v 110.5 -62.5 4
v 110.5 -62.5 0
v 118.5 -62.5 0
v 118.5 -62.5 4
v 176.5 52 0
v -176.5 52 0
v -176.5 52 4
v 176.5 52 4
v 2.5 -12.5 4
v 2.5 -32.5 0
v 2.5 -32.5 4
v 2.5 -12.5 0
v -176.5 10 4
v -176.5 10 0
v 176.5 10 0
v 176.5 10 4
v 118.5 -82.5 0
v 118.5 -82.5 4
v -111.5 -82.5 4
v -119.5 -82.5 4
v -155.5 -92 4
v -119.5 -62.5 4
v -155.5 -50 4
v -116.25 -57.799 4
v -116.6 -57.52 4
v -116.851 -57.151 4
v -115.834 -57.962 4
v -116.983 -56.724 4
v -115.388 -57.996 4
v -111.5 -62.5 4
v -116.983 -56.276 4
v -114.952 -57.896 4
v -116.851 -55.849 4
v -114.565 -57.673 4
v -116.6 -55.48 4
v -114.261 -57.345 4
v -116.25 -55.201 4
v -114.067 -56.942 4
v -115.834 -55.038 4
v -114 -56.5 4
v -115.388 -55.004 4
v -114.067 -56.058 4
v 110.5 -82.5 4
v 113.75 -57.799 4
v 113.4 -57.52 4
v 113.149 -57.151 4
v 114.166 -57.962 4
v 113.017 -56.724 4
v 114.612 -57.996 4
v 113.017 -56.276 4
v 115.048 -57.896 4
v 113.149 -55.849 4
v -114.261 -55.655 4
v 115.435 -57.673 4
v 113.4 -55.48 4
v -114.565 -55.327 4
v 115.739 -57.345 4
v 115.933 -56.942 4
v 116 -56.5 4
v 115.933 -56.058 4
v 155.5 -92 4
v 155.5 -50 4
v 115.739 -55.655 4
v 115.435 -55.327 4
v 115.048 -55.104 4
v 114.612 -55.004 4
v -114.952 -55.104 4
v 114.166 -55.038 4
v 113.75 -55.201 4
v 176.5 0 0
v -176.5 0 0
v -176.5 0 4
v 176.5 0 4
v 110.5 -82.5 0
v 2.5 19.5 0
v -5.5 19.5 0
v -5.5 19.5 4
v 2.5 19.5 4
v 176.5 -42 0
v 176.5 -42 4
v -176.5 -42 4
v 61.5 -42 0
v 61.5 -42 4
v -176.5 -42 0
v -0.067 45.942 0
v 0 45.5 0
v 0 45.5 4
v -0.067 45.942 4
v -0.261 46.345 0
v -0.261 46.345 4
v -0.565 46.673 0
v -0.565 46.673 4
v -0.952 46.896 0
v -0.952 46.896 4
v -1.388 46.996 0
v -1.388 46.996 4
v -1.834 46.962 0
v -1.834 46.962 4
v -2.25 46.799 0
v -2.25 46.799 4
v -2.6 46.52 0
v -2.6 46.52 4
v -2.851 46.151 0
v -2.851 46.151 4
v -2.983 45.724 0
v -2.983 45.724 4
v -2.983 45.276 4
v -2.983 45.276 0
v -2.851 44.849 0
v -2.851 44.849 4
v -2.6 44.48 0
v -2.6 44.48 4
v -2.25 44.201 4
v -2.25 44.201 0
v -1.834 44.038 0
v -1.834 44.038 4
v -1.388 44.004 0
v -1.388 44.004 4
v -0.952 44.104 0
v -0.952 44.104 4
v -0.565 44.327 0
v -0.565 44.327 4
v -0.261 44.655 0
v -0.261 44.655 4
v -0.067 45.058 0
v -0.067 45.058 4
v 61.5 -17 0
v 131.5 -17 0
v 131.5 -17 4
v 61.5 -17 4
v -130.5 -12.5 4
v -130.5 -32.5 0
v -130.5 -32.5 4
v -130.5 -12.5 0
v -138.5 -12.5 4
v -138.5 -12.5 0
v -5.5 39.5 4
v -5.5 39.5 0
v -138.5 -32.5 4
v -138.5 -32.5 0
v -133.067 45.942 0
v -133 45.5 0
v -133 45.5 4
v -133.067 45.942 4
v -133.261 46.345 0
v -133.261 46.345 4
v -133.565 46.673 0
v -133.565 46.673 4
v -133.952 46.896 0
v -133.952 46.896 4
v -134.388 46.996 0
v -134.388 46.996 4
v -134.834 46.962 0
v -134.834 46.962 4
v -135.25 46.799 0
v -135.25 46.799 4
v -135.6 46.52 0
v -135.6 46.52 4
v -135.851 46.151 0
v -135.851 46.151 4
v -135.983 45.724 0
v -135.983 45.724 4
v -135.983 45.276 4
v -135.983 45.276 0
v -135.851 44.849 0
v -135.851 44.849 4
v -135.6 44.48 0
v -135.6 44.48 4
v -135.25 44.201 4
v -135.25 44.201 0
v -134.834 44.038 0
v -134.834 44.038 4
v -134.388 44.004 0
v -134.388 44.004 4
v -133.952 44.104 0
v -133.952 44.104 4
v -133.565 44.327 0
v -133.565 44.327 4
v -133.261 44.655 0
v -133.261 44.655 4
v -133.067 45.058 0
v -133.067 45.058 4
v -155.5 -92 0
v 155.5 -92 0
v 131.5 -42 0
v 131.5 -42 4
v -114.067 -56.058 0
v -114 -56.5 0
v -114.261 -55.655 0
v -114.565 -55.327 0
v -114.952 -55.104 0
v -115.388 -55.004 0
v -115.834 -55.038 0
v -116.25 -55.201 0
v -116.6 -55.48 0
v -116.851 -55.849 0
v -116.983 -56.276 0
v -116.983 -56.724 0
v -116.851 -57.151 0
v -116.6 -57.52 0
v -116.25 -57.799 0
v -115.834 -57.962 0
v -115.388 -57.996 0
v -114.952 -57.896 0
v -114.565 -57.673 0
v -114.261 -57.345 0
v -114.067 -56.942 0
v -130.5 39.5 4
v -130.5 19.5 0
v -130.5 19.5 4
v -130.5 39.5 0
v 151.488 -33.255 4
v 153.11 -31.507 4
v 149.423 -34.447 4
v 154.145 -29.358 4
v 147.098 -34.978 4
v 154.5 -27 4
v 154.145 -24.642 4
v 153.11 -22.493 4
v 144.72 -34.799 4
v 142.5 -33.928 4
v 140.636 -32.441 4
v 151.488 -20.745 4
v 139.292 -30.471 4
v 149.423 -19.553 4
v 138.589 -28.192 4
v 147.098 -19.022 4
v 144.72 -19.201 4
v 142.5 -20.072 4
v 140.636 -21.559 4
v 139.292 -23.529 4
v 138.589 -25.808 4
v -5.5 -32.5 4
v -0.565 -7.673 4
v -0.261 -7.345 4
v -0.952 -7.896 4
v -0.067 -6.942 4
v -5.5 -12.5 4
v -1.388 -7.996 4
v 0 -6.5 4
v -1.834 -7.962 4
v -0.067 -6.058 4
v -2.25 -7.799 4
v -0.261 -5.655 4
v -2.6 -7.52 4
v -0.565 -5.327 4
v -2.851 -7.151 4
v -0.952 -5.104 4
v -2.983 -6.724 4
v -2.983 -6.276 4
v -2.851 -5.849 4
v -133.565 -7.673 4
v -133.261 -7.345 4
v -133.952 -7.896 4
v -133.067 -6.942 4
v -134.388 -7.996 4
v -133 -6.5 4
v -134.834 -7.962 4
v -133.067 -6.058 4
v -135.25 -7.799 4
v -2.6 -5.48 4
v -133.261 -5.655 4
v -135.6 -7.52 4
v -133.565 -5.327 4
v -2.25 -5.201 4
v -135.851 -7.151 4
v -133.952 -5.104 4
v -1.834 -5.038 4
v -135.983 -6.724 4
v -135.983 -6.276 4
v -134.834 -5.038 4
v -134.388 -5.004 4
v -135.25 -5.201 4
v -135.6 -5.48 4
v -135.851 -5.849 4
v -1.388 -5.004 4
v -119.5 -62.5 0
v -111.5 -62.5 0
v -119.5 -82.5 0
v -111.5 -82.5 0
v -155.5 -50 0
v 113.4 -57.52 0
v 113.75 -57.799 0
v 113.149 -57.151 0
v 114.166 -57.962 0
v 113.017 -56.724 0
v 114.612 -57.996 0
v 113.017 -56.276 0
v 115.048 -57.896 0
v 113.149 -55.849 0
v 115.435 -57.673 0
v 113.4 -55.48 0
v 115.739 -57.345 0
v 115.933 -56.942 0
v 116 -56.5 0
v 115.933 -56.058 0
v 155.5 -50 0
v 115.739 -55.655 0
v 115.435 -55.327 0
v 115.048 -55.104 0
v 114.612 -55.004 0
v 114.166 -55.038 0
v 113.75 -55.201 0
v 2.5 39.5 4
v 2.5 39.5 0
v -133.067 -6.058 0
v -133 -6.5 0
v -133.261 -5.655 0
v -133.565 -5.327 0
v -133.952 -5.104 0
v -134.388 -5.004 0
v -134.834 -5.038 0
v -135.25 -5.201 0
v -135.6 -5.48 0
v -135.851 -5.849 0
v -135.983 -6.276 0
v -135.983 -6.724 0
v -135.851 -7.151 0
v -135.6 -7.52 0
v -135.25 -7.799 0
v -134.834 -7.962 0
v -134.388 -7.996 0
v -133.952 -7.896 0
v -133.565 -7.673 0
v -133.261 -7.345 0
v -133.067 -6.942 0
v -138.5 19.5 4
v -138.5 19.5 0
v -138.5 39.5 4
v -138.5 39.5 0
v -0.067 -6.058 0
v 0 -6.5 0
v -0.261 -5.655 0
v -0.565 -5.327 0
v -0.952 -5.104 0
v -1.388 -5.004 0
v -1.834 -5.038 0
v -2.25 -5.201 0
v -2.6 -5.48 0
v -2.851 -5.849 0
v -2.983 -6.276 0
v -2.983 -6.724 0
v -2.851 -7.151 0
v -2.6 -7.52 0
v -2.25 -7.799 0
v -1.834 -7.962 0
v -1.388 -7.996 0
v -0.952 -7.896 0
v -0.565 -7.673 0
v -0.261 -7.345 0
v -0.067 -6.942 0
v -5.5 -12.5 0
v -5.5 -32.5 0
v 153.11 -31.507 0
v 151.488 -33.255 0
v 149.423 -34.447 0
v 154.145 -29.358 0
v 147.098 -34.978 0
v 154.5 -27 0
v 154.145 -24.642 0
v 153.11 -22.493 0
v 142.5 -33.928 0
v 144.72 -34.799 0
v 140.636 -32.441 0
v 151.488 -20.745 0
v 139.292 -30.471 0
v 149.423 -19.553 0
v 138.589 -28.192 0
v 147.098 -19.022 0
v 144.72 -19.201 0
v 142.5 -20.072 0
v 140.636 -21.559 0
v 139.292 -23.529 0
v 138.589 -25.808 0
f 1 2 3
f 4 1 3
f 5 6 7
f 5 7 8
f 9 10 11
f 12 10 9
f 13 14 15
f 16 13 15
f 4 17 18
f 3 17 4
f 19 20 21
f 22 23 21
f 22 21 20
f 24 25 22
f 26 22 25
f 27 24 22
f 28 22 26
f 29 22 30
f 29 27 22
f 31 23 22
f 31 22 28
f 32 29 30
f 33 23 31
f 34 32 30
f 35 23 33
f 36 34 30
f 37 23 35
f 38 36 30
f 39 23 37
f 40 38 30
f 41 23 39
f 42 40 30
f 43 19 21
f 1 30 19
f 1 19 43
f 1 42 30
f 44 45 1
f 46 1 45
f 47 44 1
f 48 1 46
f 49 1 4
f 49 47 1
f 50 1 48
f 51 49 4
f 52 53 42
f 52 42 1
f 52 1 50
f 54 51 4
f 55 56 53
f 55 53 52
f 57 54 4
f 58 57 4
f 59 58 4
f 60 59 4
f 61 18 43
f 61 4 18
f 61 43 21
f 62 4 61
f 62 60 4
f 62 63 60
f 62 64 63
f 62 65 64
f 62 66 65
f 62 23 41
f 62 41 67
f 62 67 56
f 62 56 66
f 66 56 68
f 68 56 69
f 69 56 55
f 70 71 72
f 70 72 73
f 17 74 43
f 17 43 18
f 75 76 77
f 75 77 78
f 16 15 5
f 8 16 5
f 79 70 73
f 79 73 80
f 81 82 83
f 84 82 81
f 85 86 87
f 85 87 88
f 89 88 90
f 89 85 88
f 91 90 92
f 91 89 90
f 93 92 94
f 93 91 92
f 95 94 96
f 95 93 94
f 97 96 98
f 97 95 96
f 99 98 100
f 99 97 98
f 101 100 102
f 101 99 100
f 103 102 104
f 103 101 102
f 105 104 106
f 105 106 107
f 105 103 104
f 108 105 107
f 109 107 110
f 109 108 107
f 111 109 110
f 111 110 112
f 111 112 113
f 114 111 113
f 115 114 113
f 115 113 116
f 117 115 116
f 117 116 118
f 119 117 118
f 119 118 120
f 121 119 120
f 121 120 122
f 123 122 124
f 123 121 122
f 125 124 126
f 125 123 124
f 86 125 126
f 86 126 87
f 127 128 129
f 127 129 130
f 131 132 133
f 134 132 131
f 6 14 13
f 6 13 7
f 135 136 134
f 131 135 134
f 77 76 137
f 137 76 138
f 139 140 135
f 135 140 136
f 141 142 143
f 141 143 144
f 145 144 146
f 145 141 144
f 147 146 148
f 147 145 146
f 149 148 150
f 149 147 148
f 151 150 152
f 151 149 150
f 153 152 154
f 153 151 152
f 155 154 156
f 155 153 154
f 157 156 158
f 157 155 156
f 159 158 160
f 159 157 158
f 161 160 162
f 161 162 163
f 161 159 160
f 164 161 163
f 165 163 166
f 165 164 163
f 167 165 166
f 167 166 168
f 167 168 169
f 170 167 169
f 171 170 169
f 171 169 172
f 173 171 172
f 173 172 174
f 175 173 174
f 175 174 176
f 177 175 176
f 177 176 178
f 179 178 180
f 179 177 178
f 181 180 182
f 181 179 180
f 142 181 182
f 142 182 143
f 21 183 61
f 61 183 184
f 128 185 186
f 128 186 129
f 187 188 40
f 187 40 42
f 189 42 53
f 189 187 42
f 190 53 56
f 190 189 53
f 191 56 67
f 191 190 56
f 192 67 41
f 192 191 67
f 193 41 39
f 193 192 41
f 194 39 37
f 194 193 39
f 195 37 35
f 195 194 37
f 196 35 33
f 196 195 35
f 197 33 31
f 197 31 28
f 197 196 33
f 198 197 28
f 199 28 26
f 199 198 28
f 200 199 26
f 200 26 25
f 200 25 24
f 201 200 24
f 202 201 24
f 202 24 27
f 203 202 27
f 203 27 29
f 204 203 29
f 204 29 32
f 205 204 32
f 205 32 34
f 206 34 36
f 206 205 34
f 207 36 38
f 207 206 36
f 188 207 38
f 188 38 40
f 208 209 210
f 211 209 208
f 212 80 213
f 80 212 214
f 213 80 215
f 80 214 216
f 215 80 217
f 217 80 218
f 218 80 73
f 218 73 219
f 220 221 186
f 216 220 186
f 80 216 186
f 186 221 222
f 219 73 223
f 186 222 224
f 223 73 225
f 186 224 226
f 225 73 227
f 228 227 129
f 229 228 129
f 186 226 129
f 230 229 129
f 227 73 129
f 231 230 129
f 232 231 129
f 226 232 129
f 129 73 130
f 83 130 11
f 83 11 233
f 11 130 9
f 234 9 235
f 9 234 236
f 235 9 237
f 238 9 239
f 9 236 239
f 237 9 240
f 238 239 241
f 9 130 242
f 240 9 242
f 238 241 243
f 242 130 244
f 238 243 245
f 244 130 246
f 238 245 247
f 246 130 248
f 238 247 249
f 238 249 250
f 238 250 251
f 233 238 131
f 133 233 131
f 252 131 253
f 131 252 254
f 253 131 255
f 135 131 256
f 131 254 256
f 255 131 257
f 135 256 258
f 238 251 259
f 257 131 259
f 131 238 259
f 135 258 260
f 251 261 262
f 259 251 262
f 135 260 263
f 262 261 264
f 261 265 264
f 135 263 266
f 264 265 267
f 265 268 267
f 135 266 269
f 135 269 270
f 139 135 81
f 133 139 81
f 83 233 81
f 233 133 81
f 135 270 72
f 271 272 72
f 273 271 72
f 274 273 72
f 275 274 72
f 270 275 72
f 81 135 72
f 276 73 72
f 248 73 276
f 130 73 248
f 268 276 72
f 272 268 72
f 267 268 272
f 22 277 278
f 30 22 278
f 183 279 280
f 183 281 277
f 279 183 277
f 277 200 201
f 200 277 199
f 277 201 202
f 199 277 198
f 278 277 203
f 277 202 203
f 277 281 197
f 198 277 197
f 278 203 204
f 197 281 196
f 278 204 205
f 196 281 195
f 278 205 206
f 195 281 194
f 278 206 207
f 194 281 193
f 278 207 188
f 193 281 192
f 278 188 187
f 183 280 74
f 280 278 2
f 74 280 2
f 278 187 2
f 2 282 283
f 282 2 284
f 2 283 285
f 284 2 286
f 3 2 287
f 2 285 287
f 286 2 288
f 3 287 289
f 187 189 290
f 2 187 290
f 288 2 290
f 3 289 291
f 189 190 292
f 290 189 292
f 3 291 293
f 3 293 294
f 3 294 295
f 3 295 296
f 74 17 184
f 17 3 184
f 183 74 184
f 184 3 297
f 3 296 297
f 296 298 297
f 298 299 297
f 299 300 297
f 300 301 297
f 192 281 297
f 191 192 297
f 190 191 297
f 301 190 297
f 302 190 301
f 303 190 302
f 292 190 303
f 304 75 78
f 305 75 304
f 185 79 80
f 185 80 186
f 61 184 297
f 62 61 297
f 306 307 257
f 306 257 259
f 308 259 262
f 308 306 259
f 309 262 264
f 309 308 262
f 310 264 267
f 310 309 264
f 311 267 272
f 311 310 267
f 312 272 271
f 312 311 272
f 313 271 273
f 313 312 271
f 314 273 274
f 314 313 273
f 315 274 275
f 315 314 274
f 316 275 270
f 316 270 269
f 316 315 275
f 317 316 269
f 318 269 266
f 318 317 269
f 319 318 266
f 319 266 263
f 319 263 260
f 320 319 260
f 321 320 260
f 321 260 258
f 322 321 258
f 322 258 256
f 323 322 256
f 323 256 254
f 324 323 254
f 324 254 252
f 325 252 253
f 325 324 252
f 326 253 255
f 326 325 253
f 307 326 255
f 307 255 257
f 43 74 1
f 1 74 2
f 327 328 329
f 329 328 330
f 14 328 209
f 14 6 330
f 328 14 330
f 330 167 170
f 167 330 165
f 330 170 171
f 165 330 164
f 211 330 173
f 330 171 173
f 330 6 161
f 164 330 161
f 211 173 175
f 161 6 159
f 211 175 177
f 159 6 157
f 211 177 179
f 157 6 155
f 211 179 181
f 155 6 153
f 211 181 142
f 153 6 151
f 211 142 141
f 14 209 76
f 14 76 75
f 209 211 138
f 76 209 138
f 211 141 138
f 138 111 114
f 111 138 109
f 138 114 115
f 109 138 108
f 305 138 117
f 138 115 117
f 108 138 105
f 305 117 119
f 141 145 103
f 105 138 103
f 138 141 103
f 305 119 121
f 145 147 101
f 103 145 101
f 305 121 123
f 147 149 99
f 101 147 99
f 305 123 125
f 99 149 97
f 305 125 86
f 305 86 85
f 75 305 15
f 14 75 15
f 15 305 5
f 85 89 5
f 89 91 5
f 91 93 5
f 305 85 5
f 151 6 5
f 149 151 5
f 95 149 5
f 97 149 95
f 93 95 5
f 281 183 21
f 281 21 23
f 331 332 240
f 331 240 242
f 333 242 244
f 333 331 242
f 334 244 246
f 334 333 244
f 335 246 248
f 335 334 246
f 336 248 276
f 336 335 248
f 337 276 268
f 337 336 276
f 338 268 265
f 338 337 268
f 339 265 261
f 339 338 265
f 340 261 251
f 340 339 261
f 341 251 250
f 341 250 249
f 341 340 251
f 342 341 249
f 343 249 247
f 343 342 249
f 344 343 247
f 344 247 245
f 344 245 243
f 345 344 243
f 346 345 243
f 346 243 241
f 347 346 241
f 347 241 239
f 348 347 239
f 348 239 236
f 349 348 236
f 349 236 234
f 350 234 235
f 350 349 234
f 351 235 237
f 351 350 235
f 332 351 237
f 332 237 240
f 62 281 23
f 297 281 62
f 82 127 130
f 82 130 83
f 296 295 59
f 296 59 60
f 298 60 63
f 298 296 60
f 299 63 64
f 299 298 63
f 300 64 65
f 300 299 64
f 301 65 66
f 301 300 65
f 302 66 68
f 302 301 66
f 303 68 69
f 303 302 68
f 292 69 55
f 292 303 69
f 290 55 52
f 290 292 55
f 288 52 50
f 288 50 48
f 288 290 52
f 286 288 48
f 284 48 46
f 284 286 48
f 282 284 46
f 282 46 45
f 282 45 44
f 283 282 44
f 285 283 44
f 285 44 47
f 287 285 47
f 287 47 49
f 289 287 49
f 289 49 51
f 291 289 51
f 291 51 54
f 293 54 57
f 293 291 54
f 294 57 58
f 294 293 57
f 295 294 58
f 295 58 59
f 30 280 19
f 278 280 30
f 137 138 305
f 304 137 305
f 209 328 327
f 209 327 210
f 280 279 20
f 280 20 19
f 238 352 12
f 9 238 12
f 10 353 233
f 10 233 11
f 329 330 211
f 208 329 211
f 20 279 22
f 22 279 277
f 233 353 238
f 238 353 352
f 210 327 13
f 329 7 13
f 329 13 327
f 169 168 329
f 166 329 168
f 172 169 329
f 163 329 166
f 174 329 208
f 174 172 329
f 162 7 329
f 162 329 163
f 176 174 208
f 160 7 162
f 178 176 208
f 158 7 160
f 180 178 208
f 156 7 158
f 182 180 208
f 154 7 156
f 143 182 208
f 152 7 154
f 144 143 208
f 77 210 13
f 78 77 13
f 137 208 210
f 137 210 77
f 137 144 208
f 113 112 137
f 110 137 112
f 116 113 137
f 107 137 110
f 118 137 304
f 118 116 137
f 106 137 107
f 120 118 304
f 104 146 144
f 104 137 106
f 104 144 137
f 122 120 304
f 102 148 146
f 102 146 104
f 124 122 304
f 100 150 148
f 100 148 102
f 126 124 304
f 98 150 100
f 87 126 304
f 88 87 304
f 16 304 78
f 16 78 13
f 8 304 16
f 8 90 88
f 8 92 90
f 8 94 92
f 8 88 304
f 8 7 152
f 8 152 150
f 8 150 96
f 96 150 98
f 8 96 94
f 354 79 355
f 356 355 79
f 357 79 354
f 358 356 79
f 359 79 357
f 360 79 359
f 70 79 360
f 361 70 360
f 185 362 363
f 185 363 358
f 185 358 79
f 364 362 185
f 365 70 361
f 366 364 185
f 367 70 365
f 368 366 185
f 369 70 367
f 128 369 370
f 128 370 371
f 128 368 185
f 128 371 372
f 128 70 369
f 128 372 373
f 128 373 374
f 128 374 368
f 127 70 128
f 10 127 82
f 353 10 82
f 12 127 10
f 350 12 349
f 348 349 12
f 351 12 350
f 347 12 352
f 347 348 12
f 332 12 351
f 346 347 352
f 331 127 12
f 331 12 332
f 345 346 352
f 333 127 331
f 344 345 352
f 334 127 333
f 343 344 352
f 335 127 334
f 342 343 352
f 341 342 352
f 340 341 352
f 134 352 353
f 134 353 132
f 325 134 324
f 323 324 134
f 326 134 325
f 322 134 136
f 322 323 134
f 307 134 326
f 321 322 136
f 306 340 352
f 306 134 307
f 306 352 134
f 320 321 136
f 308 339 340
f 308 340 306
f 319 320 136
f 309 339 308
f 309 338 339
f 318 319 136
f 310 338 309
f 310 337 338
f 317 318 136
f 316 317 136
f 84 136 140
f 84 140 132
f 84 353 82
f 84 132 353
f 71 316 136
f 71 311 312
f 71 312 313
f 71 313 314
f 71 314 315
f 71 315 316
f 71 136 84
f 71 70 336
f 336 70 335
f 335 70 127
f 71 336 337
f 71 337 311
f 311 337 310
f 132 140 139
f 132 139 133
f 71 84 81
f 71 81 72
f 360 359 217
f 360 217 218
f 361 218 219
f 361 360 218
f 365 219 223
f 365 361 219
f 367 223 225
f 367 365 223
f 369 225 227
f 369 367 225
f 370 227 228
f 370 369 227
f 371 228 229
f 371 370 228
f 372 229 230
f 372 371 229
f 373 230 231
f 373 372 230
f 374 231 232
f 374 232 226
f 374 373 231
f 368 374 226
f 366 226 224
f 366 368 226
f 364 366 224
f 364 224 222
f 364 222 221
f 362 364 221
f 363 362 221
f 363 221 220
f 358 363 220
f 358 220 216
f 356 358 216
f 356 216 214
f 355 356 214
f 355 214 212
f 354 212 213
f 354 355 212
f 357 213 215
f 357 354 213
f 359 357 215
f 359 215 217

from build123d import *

# Parameters (mm, degrees)
SKETCH_R      = 1.5
SKETCH_R_2    = 8
SKETCH_W      = 8
SKETCH_H      = 20
PAD_DEPTH     = 4
SKETCH001_W   = 353
SKETCH001_H   = 42
SKETCH001_R   = 1.5
SKETCH001_W_2 = 8
SKETCH001_H_2 = 20
PAD001_DEPTH  = 4
SKETCH002_W   = 311
SKETCH002_H   = 42
SKETCH002_R   = 1.5
SKETCH002_W_2 = 8
SKETCH002_H_2 = 20
PAD002_DEPTH  = 4


with BuildPart() as left:
    # Sketch → Pad (new body)
    with BuildSketch(Plane.XY):
        Polygon((-176.5, 0), (176.5, 0), (176.5, -42), (131.5, -42), (131.5, -17), (61.5, -17), (61.5, -42), (-176.5, -42), align=None)
        with Locations((-134.5, -6.5)):
            Circle(SKETCH_R, mode=Mode.SUBTRACT)
        with Locations((-1.5, -6.5)):
            Circle(SKETCH_R, mode=Mode.SUBTRACT)
        with Locations((146.5, -27)):
            Circle(SKETCH_R_2, mode=Mode.SUBTRACT)
        with Locations((-134.5, -22.5)):
            Rectangle(SKETCH_W, SKETCH_H, mode=Mode.SUBTRACT)
        with Locations((-1.5, -22.5)):
            Rectangle(SKETCH_W, SKETCH_H, mode=Mode.SUBTRACT)
    extrude(amount=PAD_DEPTH)


with BuildPart() as right:
    # Sketch001 → Pad001 (new body)
    with BuildSketch(Plane.XY):
        with Locations((0, 31)):
            Rectangle(SKETCH001_W, SKETCH001_H)
        with Locations((-134.5, 45.5)):
            Circle(SKETCH001_R, mode=Mode.SUBTRACT)
        with Locations((-1.5, 45.5)):
            Circle(SKETCH001_R, mode=Mode.SUBTRACT)
        with Locations((-134.5, 29.5)):
            Rectangle(SKETCH001_W_2, SKETCH001_H_2, mode=Mode.SUBTRACT)
        with Locations((-1.5, 29.5)):
            Rectangle(SKETCH001_W_2, SKETCH001_H_2, mode=Mode.SUBTRACT)
    extrude(amount=PAD001_DEPTH)


with BuildPart() as up:
    # Sketch002 → Pad002 (new body)
    with BuildSketch(Plane.XY):
        with Locations((0, -71)):
            Rectangle(SKETCH002_W, SKETCH002_H)
        with Locations((-115.5, -56.5)):
            Circle(SKETCH002_R, mode=Mode.SUBTRACT)
        with Locations((114.5, -56.5)):
            Circle(SKETCH002_R, mode=Mode.SUBTRACT)
        with Locations((-115.5, -72.5)):
            Rectangle(SKETCH002_W_2, SKETCH002_H_2, mode=Mode.SUBTRACT)
        with Locations((114.5, -72.5)):
            Rectangle(SKETCH002_W_2, SKETCH002_H_2, mode=Mode.SUBTRACT)
    extrude(amount=PAD002_DEPTH)


solid = Compound([left.part, right.part, up.part])
